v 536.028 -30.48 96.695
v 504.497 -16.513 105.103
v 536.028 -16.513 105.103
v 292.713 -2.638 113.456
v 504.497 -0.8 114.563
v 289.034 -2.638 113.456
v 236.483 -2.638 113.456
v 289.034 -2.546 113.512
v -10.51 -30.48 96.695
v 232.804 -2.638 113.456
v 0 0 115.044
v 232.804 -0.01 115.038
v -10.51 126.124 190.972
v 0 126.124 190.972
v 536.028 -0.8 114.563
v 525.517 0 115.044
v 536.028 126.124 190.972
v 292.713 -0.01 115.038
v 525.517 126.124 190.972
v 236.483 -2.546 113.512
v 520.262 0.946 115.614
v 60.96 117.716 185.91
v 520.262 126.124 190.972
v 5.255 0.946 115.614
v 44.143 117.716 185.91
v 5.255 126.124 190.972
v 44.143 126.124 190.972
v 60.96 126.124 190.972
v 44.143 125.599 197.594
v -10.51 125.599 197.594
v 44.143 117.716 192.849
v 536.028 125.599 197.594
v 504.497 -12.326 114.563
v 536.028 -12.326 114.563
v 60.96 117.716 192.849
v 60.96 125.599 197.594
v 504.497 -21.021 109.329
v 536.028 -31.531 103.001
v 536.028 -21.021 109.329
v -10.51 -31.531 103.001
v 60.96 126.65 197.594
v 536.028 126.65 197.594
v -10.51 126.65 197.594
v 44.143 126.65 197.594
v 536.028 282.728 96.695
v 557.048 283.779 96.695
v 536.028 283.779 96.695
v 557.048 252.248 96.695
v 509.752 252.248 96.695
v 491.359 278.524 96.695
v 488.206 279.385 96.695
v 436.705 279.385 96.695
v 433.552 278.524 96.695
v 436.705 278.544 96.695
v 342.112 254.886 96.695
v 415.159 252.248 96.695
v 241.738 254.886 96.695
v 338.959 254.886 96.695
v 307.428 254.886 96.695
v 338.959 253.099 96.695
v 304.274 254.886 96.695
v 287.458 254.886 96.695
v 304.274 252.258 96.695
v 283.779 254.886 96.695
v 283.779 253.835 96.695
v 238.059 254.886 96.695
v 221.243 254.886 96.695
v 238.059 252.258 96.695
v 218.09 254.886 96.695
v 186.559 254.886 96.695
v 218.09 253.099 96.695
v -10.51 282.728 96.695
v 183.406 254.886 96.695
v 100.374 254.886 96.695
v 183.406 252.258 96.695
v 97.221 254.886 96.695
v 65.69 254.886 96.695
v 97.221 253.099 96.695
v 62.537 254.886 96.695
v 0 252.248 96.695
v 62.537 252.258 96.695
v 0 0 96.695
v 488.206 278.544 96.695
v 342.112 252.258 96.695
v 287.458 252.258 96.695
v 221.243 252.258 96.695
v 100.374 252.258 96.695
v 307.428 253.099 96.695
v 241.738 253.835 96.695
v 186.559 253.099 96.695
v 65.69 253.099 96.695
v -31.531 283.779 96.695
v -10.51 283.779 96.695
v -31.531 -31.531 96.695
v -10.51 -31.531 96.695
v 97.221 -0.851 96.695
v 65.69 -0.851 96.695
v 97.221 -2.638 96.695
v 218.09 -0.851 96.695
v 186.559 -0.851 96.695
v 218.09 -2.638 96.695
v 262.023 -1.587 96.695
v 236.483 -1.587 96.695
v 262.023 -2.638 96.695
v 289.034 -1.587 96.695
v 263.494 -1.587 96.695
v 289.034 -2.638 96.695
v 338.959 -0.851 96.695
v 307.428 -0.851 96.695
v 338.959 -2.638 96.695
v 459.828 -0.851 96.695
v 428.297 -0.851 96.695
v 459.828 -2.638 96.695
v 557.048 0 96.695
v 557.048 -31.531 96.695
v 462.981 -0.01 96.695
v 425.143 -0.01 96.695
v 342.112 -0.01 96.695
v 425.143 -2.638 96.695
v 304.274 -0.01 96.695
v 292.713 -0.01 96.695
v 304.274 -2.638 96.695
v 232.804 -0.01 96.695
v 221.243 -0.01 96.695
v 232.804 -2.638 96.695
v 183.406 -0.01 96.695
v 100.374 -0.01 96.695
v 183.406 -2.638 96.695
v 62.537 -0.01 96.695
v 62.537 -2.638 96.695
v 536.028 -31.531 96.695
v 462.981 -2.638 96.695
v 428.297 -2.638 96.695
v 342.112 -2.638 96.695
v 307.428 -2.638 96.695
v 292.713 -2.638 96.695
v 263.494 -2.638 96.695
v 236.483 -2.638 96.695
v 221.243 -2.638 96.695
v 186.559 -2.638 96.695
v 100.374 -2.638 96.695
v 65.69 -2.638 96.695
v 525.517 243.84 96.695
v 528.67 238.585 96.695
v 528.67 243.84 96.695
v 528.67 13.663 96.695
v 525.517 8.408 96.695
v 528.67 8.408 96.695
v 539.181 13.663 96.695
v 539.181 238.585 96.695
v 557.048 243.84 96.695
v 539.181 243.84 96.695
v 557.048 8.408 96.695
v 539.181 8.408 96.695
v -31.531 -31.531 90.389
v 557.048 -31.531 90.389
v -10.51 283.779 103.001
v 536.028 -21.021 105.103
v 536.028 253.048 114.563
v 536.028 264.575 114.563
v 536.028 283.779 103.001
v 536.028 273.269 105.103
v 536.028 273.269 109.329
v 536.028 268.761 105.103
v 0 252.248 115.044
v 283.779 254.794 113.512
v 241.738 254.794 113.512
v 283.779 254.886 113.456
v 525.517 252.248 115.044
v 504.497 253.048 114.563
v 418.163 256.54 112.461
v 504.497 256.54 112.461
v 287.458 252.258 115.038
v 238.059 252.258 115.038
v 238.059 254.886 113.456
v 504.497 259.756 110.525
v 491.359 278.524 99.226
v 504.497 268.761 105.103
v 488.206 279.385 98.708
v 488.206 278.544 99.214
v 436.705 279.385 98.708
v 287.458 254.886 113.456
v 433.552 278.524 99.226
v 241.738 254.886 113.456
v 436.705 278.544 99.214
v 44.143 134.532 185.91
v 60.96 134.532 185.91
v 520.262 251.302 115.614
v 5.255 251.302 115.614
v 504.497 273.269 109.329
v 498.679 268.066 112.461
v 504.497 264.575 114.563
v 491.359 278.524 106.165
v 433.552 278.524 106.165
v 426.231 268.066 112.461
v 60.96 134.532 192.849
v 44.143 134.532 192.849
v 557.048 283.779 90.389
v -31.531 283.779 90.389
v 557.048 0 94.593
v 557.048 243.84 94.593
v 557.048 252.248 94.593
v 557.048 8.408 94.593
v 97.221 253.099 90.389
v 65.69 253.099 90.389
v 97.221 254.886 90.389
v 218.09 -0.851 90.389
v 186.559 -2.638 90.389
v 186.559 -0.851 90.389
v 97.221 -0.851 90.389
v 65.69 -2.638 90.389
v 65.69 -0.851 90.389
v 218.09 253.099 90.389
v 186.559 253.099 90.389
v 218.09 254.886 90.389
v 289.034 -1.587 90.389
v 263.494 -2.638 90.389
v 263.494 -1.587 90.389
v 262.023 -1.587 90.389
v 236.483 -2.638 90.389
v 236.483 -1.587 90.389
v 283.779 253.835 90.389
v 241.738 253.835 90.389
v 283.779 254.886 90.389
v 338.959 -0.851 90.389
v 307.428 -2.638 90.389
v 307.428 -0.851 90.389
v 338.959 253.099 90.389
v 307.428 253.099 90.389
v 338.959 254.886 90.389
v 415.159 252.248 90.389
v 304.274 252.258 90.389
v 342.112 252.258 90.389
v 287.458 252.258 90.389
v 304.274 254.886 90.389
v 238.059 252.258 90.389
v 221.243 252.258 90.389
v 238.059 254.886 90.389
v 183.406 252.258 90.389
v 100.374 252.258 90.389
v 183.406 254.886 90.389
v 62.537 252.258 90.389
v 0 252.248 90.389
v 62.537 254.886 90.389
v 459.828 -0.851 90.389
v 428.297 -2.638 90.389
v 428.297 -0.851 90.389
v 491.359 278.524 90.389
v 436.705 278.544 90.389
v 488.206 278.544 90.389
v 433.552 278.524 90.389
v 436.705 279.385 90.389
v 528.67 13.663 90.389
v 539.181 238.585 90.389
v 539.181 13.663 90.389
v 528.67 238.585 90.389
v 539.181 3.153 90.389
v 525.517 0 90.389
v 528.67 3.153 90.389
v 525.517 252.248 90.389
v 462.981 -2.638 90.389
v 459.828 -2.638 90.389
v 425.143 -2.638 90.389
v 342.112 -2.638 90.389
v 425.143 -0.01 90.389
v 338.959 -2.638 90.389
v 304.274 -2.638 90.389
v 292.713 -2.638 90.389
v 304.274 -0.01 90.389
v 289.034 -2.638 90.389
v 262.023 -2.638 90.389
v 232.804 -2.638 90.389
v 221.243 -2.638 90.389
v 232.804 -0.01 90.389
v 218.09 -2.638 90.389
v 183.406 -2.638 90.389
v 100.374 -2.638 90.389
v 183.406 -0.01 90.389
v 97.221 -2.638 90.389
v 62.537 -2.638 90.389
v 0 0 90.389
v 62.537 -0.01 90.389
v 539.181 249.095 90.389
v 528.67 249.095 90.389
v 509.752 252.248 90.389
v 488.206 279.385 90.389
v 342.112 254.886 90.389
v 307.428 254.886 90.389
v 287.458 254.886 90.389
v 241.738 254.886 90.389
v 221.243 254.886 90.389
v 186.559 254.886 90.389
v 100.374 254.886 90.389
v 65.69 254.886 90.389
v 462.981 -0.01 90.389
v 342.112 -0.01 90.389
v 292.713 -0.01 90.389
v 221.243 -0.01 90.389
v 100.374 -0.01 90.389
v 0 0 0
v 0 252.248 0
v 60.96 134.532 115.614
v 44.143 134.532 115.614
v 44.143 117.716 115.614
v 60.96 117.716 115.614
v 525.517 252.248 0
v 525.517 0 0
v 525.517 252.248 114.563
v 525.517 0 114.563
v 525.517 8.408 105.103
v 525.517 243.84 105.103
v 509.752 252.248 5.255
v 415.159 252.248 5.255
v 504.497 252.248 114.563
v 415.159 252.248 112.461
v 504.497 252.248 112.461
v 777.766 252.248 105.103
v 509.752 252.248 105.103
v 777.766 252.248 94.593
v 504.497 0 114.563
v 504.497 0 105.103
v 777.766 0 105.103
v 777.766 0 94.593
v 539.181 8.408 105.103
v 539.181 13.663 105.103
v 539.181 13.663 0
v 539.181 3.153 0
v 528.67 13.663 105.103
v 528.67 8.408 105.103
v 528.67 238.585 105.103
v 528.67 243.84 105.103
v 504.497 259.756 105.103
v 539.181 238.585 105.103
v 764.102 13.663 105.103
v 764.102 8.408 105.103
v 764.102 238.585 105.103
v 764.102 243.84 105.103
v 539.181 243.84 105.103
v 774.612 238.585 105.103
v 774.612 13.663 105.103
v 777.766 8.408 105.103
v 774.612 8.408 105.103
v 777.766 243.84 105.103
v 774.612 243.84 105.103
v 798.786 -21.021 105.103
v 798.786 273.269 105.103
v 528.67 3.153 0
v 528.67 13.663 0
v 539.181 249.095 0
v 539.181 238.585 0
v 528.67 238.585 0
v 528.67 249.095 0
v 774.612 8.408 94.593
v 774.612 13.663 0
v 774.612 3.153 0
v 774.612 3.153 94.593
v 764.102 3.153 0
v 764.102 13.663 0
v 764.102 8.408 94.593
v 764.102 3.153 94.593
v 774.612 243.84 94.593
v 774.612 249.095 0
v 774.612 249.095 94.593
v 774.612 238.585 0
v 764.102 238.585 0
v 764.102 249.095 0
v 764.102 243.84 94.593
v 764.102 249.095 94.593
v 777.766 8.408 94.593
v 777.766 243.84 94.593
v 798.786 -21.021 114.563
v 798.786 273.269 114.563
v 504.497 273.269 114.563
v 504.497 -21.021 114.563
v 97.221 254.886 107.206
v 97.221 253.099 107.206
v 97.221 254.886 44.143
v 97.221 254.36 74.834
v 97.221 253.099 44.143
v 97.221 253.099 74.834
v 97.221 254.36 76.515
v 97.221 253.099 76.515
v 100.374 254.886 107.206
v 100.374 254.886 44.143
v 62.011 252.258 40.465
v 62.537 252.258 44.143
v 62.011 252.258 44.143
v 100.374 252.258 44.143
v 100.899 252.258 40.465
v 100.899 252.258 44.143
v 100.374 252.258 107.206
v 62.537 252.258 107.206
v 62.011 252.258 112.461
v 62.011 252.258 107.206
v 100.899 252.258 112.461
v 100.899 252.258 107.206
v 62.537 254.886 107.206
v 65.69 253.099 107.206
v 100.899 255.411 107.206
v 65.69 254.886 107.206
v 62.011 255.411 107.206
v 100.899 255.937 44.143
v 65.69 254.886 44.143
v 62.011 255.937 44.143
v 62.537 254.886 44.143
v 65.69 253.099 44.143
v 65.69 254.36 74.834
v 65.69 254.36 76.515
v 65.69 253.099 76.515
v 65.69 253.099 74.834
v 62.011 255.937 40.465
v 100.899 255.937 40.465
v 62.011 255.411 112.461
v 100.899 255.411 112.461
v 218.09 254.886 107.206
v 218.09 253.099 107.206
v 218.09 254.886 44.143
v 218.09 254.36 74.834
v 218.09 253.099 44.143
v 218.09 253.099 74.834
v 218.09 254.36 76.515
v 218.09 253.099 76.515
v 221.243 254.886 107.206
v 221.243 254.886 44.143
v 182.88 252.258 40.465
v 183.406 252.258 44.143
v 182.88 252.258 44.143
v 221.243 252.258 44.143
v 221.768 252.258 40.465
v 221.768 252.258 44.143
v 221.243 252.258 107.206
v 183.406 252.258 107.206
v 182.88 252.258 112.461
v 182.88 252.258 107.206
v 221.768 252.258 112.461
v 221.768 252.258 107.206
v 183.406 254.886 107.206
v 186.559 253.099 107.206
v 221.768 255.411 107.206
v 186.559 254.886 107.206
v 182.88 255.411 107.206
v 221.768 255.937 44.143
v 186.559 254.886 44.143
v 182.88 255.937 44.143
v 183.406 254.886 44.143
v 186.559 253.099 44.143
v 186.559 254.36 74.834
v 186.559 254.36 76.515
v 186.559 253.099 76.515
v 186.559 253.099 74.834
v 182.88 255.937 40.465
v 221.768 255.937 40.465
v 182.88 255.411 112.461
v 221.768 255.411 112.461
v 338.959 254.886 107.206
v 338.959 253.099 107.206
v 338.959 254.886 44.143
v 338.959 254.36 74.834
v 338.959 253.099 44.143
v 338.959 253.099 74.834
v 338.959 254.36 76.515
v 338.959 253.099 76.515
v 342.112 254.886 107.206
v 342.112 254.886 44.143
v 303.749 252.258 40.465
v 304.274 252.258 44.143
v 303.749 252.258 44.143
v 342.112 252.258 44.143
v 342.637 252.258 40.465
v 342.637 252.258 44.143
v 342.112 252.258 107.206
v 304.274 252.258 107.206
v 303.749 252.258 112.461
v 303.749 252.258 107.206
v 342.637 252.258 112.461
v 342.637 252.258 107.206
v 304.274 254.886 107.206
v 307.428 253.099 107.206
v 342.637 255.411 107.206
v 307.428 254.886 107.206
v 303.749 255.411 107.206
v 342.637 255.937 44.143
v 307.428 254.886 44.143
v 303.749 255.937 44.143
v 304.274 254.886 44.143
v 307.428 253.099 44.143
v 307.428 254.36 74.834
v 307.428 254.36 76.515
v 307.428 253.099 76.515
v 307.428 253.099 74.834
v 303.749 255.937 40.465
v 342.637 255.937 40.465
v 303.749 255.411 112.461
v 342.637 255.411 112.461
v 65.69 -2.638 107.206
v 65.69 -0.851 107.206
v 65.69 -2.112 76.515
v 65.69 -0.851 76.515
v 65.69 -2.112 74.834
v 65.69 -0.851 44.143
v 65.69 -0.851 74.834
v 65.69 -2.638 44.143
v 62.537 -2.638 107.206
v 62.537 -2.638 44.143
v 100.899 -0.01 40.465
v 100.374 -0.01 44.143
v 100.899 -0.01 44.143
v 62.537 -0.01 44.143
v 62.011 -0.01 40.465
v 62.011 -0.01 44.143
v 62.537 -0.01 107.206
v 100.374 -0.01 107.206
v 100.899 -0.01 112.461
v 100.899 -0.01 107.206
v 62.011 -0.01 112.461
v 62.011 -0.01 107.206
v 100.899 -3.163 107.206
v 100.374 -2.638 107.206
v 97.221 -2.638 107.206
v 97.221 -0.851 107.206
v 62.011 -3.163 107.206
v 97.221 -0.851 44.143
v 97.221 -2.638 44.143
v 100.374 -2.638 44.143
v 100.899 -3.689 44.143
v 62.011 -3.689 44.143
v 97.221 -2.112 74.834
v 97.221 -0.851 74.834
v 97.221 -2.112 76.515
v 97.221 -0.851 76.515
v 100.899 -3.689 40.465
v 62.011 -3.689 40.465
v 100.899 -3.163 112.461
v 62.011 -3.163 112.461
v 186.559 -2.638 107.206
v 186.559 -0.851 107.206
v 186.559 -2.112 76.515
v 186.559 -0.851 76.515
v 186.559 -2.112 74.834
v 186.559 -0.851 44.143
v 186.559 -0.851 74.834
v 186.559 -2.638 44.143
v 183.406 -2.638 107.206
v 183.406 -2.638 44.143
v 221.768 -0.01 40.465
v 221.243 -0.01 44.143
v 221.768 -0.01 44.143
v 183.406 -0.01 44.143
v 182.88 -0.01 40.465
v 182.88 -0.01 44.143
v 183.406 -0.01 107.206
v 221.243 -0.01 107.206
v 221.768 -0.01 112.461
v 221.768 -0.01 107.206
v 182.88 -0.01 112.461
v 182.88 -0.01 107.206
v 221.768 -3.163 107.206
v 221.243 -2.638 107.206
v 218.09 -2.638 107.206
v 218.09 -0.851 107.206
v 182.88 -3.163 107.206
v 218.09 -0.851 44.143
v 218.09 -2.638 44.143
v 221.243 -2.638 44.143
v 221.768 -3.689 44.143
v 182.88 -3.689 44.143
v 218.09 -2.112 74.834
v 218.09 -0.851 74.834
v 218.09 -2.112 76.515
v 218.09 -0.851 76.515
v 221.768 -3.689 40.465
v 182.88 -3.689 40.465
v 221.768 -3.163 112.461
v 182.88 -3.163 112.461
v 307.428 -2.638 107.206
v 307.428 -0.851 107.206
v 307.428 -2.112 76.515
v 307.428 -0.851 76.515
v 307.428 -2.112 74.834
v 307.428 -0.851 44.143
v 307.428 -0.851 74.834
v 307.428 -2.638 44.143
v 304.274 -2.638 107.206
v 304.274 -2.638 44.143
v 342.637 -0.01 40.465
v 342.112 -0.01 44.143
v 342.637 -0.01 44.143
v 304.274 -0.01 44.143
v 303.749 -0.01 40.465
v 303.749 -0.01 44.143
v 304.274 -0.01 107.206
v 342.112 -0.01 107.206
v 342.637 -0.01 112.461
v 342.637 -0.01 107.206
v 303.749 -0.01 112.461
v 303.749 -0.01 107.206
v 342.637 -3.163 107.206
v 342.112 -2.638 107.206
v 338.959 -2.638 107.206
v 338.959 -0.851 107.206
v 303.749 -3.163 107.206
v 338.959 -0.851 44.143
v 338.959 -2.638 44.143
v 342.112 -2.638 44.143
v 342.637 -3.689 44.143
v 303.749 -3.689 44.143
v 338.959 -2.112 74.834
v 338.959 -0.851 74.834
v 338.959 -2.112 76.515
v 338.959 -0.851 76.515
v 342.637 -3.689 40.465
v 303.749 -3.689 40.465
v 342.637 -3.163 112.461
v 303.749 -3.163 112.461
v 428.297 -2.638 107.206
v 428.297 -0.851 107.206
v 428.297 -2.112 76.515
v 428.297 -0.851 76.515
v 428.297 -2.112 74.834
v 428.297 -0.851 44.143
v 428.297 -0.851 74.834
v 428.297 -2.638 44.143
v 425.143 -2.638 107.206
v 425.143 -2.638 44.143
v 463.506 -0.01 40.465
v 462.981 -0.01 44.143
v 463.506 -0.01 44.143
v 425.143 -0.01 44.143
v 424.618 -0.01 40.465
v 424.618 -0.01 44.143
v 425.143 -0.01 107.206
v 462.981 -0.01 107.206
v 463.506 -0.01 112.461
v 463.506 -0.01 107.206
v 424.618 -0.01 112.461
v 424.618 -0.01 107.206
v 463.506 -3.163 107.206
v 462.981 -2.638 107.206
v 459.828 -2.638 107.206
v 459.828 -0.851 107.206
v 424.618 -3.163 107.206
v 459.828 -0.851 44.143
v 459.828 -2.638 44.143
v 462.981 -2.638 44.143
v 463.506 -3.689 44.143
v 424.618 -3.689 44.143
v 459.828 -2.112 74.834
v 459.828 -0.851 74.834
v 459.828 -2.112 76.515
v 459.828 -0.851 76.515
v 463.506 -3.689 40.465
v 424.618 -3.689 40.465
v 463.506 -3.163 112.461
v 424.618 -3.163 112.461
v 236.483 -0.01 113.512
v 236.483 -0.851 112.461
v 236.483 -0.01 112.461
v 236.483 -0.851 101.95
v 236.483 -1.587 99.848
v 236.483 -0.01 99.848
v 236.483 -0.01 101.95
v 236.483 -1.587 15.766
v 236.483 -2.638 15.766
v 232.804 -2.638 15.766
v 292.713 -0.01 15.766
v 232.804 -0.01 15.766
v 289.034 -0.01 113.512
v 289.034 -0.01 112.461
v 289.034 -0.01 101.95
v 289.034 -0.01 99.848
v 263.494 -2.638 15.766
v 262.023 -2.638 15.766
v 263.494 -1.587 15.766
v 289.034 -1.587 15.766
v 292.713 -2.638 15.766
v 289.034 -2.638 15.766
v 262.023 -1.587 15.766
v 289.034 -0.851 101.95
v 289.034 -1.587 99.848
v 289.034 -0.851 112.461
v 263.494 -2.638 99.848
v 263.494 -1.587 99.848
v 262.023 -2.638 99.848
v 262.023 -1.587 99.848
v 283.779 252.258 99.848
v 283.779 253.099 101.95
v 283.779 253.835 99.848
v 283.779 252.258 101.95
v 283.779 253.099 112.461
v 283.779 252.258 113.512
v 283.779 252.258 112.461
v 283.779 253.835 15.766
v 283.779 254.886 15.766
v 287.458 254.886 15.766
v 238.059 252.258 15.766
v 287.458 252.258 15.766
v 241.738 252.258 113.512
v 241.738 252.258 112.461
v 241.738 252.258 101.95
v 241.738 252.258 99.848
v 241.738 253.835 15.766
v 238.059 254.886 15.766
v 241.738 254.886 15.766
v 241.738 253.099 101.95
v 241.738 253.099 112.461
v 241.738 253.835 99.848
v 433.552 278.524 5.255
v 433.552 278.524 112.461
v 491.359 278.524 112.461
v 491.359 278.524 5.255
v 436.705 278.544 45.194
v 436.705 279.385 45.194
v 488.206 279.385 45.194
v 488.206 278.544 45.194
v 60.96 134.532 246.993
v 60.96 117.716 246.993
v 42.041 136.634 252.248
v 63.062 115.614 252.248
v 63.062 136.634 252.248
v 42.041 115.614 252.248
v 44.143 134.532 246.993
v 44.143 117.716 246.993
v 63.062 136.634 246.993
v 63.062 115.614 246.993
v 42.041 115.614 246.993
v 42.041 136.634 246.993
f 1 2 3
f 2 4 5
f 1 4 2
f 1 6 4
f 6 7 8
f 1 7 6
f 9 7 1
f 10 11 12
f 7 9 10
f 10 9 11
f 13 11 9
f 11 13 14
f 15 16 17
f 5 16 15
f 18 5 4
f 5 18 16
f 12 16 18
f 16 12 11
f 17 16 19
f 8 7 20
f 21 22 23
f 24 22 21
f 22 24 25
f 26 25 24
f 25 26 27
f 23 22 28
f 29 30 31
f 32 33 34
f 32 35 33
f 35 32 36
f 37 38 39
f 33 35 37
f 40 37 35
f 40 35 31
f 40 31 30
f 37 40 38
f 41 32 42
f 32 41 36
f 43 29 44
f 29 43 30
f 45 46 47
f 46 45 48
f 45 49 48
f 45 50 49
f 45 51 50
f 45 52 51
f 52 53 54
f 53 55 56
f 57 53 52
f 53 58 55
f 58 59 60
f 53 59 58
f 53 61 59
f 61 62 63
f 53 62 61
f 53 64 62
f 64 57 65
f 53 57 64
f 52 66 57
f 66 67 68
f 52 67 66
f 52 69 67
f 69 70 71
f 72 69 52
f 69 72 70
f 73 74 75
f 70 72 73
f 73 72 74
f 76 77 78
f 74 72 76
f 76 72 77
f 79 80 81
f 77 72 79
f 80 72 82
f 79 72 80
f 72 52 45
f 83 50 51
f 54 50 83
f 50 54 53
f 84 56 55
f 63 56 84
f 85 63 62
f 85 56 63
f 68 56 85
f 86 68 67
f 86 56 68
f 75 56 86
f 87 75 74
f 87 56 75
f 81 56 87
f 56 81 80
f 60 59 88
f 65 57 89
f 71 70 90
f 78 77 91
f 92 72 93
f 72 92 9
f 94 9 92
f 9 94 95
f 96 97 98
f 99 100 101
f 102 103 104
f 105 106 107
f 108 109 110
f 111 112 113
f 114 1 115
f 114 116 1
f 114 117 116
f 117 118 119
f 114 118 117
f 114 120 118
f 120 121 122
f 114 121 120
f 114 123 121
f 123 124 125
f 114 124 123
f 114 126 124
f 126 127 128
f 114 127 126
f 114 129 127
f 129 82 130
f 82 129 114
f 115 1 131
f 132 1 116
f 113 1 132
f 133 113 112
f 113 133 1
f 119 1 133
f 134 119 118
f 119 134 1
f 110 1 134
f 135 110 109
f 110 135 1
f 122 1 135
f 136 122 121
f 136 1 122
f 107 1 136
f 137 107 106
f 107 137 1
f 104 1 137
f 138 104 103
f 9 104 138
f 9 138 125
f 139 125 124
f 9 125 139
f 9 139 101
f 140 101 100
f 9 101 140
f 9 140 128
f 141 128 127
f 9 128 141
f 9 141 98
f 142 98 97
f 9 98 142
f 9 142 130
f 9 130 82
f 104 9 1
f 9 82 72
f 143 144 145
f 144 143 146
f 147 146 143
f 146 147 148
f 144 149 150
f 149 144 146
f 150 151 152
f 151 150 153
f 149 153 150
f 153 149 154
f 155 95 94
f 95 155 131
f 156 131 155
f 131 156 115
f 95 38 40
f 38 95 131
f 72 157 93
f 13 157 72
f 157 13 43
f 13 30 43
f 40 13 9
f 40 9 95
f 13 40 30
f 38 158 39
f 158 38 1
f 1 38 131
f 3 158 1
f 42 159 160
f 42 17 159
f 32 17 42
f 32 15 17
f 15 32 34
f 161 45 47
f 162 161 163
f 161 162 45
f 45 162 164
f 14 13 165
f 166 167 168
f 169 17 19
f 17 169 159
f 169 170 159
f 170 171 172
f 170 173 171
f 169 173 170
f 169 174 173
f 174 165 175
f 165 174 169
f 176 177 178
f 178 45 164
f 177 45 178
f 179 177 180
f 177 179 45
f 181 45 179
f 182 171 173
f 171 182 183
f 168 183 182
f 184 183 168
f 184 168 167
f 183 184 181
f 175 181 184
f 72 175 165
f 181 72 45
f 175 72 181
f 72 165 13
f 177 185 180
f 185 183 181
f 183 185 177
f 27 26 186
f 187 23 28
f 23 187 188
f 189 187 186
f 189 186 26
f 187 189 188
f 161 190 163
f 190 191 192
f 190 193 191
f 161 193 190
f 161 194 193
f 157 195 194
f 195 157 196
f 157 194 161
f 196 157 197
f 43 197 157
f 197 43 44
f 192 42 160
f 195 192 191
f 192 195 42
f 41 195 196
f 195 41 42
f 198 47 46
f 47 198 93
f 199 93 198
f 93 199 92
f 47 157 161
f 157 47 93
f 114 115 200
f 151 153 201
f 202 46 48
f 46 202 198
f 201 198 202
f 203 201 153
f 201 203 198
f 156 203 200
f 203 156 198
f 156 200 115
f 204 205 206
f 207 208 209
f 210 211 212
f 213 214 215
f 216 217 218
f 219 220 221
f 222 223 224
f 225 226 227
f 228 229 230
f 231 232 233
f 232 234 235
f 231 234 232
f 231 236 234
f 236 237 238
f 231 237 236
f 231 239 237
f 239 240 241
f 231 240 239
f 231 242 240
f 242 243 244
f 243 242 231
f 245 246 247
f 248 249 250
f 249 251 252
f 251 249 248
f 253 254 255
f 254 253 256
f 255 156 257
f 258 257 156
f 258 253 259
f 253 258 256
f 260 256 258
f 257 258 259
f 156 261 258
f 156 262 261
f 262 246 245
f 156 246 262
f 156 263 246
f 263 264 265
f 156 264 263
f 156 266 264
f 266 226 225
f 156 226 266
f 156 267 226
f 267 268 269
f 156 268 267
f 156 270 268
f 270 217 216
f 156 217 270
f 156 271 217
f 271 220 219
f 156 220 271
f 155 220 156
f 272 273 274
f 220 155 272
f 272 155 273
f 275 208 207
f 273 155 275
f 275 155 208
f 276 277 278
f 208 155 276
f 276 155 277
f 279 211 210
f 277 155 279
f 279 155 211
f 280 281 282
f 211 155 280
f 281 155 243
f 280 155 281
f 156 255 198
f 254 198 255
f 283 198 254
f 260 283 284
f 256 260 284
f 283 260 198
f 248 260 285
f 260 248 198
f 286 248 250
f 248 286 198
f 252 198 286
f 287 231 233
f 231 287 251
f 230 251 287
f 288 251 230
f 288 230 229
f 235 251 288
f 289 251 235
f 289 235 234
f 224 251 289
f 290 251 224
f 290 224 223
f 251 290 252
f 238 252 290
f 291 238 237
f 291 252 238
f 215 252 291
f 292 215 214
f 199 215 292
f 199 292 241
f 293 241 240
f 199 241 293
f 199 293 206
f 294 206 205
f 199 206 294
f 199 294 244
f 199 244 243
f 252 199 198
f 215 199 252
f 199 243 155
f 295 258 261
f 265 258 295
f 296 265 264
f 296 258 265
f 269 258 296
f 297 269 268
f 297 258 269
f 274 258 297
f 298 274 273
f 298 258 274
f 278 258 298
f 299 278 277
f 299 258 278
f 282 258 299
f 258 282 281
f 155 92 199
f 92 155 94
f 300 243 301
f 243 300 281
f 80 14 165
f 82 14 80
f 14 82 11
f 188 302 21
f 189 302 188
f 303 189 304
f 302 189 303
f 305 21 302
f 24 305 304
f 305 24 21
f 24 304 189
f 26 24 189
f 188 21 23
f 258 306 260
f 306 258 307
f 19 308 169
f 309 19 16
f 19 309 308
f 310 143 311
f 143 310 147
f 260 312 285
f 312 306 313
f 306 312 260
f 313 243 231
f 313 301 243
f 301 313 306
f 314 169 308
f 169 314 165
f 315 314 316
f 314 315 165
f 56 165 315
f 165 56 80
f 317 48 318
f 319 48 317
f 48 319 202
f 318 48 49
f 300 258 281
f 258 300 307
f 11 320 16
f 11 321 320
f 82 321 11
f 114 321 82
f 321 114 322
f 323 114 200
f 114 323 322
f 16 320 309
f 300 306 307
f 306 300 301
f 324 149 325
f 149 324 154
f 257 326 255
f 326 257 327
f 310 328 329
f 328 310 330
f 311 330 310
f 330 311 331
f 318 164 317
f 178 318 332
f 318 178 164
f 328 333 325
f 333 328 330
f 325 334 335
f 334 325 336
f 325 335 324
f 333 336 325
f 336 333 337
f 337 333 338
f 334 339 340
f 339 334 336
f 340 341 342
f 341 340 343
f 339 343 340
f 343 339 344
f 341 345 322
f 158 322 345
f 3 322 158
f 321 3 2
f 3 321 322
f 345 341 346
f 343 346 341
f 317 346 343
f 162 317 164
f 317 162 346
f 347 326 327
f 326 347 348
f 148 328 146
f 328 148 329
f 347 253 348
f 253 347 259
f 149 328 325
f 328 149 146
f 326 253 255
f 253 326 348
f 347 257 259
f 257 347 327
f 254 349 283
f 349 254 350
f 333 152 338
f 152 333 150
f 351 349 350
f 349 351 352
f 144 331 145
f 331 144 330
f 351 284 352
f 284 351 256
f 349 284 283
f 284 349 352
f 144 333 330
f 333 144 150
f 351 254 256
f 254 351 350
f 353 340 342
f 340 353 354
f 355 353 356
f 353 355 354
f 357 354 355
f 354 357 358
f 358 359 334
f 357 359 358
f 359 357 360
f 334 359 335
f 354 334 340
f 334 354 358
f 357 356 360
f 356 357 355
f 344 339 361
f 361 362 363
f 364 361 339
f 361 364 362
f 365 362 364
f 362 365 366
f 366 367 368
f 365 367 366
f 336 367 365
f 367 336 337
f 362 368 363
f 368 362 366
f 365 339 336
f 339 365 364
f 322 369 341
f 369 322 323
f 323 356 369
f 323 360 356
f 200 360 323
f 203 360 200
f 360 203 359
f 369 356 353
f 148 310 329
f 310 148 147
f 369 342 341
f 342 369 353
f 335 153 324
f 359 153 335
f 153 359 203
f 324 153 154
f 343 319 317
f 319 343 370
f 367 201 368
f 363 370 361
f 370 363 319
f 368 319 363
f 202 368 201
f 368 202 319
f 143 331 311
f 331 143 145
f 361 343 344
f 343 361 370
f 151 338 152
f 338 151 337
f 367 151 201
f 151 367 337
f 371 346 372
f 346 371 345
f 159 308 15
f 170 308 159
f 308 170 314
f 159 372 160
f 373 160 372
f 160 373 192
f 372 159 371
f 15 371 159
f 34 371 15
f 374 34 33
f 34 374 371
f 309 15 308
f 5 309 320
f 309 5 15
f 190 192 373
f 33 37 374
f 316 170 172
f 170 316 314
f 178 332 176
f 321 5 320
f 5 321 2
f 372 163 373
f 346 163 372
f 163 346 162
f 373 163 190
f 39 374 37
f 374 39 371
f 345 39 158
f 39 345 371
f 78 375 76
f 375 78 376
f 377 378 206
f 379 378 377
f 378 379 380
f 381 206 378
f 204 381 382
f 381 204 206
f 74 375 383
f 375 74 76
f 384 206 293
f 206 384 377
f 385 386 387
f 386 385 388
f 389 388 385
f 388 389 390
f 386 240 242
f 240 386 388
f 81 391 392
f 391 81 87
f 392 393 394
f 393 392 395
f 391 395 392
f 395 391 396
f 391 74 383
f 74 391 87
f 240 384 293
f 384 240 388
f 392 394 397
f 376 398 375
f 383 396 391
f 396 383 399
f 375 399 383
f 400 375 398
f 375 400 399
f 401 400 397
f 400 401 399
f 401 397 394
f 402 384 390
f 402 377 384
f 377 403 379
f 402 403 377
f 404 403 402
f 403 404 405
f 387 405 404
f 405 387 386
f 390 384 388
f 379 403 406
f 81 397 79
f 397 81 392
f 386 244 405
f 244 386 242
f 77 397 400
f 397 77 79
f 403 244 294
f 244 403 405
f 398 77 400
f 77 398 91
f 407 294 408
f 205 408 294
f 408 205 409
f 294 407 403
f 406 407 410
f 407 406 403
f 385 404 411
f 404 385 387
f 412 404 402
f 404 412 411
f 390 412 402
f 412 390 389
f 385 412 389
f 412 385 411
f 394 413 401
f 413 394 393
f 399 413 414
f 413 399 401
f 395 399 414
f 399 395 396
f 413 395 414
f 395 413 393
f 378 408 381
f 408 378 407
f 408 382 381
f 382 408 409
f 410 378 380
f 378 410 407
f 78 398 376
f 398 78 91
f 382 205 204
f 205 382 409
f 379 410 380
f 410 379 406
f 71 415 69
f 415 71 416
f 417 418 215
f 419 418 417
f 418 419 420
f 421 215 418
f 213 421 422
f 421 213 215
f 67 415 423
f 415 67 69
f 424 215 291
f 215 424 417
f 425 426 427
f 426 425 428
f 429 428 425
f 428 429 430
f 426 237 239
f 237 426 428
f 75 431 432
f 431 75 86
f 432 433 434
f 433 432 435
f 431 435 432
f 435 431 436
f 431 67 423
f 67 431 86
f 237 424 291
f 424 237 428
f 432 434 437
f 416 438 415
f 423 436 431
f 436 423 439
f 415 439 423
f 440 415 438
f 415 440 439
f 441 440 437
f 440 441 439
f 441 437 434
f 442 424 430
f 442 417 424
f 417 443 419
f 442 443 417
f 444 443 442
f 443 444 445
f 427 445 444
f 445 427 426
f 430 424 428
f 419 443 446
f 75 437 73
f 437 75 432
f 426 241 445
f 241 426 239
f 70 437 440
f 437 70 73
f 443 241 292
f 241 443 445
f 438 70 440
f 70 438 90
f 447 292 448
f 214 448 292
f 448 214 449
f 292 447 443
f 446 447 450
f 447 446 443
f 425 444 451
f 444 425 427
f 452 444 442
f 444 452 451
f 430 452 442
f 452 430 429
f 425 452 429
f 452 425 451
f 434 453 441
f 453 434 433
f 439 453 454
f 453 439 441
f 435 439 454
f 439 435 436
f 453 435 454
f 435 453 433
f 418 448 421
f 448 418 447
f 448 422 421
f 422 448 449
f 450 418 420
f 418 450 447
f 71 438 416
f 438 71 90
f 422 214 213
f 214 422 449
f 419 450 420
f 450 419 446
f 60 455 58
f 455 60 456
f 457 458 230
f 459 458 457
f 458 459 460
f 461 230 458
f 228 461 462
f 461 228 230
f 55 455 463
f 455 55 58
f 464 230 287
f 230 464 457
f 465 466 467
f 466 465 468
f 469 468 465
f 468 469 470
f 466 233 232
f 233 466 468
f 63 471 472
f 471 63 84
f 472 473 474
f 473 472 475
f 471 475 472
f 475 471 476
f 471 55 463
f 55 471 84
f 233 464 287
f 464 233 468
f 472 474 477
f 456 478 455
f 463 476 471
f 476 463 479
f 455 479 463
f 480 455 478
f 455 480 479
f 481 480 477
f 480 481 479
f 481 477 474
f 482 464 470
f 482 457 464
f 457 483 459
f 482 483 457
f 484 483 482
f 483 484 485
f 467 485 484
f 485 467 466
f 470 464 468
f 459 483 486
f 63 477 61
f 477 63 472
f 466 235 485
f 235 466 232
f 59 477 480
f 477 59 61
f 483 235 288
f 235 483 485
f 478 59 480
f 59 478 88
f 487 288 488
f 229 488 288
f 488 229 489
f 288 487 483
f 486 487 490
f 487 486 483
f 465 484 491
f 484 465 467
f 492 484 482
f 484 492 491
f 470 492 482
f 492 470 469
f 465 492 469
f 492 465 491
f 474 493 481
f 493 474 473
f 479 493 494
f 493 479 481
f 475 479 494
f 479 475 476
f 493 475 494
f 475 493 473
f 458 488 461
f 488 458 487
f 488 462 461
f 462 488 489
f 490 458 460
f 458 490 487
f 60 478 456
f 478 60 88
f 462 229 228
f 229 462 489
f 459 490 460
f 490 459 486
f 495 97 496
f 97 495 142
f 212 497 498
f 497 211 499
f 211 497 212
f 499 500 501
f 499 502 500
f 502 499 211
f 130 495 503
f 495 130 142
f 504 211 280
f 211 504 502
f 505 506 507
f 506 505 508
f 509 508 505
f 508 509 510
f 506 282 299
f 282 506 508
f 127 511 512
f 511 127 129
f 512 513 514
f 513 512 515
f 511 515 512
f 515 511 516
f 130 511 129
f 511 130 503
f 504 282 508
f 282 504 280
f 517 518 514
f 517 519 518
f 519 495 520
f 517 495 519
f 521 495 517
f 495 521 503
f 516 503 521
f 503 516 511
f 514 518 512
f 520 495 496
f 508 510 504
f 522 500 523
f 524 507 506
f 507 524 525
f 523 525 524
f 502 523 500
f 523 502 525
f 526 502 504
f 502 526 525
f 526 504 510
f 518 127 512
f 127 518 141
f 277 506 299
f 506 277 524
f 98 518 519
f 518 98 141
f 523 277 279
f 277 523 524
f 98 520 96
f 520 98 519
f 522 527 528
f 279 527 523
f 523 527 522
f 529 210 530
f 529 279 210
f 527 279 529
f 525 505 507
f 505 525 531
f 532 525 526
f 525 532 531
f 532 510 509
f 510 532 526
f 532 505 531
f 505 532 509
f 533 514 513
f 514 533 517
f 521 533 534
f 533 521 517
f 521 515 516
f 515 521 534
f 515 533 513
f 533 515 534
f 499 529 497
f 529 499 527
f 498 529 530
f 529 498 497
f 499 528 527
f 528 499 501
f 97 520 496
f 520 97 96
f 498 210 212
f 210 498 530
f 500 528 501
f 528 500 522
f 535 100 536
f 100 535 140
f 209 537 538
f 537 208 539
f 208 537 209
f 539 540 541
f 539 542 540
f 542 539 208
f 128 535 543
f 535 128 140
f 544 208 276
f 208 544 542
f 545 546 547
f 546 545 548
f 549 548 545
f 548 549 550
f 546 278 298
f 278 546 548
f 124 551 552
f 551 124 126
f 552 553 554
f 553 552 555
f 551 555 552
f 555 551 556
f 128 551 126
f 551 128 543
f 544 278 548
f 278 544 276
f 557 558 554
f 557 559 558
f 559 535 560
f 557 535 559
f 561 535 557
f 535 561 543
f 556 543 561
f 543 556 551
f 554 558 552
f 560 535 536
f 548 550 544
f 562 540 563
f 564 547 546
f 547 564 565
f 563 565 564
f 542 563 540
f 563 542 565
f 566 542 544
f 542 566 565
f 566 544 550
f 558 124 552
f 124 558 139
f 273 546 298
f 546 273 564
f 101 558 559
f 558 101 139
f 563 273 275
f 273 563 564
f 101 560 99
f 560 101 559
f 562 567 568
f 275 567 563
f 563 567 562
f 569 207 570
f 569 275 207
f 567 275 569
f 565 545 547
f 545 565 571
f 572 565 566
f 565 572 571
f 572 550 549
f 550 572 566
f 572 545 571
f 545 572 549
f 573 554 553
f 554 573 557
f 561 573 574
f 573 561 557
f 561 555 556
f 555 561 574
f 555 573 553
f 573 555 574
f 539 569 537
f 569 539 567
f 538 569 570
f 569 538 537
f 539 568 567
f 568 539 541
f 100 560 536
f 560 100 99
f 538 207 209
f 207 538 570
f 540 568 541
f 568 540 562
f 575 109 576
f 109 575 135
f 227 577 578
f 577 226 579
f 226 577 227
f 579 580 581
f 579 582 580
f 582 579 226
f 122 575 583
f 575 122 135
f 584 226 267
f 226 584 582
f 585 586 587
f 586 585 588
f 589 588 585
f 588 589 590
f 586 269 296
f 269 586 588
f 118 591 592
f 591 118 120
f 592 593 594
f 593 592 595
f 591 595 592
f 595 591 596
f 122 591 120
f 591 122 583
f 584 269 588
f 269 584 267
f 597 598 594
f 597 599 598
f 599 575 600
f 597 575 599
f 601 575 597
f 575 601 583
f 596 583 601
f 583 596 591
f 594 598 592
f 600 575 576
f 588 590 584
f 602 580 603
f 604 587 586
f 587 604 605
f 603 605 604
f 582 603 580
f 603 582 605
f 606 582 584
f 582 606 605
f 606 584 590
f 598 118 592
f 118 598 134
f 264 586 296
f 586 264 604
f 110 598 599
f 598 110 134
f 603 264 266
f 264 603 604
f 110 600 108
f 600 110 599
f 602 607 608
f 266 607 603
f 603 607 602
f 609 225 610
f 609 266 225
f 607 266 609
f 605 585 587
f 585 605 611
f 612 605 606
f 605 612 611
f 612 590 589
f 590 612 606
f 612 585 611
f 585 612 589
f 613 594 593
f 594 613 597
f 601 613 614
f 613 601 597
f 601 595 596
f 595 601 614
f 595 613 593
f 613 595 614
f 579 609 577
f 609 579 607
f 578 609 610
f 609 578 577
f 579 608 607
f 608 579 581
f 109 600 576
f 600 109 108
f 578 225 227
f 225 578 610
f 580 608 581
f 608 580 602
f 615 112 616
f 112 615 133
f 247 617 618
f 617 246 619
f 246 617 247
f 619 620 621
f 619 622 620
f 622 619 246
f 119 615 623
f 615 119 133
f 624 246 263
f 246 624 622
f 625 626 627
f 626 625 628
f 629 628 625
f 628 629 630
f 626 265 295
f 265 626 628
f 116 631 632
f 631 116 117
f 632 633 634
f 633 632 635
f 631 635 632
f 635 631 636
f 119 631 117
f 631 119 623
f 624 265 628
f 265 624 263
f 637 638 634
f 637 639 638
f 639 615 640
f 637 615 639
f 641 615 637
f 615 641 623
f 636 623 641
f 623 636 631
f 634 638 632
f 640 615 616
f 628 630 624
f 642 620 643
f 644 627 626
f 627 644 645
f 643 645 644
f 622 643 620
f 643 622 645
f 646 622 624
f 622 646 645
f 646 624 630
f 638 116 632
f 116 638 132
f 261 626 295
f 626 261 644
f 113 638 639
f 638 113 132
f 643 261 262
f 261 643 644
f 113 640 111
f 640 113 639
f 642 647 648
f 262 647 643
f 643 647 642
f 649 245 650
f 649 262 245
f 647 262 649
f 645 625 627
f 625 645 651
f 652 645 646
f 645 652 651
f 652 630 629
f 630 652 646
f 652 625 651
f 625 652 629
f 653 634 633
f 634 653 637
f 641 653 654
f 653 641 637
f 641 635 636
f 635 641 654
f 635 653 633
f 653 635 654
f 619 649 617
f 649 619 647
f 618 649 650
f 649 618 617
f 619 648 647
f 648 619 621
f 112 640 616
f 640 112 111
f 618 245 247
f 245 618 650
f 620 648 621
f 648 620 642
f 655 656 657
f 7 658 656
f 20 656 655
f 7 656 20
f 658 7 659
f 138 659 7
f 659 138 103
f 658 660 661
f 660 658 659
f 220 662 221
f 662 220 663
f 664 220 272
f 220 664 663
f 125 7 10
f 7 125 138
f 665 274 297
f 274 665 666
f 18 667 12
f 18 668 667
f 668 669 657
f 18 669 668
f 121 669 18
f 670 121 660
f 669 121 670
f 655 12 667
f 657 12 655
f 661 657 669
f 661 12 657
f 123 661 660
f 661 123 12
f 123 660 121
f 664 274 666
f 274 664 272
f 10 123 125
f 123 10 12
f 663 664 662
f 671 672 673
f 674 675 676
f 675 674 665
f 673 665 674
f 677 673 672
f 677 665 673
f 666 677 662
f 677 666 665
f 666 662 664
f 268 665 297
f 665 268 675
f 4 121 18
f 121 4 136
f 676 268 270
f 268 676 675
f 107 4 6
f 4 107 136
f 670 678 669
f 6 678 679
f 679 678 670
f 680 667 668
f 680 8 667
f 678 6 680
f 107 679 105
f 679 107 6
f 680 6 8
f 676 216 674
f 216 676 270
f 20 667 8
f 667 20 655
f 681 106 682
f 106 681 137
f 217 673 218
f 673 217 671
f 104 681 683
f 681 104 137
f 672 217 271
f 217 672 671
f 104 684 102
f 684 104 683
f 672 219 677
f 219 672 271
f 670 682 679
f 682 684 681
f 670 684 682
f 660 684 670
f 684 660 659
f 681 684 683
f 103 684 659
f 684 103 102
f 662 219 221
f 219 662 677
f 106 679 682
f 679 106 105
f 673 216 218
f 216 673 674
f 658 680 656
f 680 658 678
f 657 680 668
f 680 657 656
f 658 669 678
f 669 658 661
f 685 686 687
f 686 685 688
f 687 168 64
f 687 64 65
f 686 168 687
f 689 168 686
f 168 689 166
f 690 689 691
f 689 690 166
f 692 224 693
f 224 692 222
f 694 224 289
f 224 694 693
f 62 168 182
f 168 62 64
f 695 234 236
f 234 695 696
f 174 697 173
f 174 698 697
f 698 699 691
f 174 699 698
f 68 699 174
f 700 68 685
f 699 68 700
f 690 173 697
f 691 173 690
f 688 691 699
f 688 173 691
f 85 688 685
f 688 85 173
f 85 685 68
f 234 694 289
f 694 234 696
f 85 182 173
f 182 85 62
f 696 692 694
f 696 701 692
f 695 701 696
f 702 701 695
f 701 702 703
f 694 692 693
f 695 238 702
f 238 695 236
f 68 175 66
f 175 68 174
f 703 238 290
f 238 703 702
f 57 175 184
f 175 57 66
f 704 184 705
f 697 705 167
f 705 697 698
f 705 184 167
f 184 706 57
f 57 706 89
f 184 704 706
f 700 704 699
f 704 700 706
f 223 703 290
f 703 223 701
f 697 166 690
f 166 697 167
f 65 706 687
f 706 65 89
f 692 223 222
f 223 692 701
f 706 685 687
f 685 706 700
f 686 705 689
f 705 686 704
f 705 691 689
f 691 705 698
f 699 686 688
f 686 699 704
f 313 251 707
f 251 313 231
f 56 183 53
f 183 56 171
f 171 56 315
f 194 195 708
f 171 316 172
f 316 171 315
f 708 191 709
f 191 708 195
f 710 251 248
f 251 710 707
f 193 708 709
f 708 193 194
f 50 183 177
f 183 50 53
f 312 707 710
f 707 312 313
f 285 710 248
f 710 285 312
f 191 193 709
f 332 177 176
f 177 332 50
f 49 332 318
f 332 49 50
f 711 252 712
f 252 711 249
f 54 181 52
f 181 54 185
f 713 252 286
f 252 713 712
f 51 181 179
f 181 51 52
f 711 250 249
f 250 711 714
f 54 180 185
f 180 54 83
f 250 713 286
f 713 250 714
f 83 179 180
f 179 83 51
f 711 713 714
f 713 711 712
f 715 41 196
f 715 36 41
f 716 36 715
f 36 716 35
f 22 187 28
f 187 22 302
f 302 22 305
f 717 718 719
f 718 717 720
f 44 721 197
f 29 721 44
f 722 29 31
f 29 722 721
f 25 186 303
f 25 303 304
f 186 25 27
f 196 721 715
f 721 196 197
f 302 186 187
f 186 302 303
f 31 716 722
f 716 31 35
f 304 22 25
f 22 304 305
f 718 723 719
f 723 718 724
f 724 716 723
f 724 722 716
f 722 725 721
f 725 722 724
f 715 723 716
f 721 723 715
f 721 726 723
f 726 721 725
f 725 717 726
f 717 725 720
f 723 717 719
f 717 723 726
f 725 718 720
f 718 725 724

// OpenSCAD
// =====================================================================
//  MILWAUKEE ROAD - NASHOTAH, WIS. PASSENGER STATION
//  Source: Album sheet 94, built 1915.  Drawings are private reference (in copyright):
//  Research Library / RSW / Stations / Standard depots / Album of Depot Plans 1919.
//  Rib Side Works, 24 Nov 2026. FIRST SHAPE MODEL for review - not cut into print sections.
//  KNOWN (from the sheet): 50 x 24 ft, waiting room 22 ft 6 x 40, ticket office 9 x 16 ft 6; stucco, asbestos shingles; built on a slope with a lower storey and grand stair on the track side (lower storey NOT modelled yet).
//  ESTIMATE: wall and ridge heights where not written, window count and spacing, colours.
//  Built with the shared depot builder ../../../_common/rsw_depot.scad (x along the track,
//  y = 0 town side, track side +y, feet).  SCALE: 29 = G, 48 = O, 87 = HO.
// =====================================================================
SCALE = 29;
include <../../../_common/rsw_depot.scad>

depot(blocks = [[0, 50, 0, 24, 11, 0.6, 1, 3, 1]],
      pavs   = [[50, 24, 0, 24, 10, 0.1, 4, 2, 2, 2]],
      wins   = [[7.75, 1, 3, 6, 4.2], [19.25, 1, 3, 6, 4.2], [30.75, 1, 3, 6, 4.2], [42.25, 1, 3, 6, 4.2], [7.75, 0, 3, 6, 4.2], [19.25, 0, 3, 6, 4.2], [30.75, 0, 3, 6, 4.2], [42.25, 0, 3, 6, 4.2]],
      doors  = [[25, 0, 5, 8, 1], [25, 1, 4, 8, 0]],
      bays   = [[44, 1, 9, 2.5]],
      chims  = [[5, 12, 24]],
      plat   = 0);
